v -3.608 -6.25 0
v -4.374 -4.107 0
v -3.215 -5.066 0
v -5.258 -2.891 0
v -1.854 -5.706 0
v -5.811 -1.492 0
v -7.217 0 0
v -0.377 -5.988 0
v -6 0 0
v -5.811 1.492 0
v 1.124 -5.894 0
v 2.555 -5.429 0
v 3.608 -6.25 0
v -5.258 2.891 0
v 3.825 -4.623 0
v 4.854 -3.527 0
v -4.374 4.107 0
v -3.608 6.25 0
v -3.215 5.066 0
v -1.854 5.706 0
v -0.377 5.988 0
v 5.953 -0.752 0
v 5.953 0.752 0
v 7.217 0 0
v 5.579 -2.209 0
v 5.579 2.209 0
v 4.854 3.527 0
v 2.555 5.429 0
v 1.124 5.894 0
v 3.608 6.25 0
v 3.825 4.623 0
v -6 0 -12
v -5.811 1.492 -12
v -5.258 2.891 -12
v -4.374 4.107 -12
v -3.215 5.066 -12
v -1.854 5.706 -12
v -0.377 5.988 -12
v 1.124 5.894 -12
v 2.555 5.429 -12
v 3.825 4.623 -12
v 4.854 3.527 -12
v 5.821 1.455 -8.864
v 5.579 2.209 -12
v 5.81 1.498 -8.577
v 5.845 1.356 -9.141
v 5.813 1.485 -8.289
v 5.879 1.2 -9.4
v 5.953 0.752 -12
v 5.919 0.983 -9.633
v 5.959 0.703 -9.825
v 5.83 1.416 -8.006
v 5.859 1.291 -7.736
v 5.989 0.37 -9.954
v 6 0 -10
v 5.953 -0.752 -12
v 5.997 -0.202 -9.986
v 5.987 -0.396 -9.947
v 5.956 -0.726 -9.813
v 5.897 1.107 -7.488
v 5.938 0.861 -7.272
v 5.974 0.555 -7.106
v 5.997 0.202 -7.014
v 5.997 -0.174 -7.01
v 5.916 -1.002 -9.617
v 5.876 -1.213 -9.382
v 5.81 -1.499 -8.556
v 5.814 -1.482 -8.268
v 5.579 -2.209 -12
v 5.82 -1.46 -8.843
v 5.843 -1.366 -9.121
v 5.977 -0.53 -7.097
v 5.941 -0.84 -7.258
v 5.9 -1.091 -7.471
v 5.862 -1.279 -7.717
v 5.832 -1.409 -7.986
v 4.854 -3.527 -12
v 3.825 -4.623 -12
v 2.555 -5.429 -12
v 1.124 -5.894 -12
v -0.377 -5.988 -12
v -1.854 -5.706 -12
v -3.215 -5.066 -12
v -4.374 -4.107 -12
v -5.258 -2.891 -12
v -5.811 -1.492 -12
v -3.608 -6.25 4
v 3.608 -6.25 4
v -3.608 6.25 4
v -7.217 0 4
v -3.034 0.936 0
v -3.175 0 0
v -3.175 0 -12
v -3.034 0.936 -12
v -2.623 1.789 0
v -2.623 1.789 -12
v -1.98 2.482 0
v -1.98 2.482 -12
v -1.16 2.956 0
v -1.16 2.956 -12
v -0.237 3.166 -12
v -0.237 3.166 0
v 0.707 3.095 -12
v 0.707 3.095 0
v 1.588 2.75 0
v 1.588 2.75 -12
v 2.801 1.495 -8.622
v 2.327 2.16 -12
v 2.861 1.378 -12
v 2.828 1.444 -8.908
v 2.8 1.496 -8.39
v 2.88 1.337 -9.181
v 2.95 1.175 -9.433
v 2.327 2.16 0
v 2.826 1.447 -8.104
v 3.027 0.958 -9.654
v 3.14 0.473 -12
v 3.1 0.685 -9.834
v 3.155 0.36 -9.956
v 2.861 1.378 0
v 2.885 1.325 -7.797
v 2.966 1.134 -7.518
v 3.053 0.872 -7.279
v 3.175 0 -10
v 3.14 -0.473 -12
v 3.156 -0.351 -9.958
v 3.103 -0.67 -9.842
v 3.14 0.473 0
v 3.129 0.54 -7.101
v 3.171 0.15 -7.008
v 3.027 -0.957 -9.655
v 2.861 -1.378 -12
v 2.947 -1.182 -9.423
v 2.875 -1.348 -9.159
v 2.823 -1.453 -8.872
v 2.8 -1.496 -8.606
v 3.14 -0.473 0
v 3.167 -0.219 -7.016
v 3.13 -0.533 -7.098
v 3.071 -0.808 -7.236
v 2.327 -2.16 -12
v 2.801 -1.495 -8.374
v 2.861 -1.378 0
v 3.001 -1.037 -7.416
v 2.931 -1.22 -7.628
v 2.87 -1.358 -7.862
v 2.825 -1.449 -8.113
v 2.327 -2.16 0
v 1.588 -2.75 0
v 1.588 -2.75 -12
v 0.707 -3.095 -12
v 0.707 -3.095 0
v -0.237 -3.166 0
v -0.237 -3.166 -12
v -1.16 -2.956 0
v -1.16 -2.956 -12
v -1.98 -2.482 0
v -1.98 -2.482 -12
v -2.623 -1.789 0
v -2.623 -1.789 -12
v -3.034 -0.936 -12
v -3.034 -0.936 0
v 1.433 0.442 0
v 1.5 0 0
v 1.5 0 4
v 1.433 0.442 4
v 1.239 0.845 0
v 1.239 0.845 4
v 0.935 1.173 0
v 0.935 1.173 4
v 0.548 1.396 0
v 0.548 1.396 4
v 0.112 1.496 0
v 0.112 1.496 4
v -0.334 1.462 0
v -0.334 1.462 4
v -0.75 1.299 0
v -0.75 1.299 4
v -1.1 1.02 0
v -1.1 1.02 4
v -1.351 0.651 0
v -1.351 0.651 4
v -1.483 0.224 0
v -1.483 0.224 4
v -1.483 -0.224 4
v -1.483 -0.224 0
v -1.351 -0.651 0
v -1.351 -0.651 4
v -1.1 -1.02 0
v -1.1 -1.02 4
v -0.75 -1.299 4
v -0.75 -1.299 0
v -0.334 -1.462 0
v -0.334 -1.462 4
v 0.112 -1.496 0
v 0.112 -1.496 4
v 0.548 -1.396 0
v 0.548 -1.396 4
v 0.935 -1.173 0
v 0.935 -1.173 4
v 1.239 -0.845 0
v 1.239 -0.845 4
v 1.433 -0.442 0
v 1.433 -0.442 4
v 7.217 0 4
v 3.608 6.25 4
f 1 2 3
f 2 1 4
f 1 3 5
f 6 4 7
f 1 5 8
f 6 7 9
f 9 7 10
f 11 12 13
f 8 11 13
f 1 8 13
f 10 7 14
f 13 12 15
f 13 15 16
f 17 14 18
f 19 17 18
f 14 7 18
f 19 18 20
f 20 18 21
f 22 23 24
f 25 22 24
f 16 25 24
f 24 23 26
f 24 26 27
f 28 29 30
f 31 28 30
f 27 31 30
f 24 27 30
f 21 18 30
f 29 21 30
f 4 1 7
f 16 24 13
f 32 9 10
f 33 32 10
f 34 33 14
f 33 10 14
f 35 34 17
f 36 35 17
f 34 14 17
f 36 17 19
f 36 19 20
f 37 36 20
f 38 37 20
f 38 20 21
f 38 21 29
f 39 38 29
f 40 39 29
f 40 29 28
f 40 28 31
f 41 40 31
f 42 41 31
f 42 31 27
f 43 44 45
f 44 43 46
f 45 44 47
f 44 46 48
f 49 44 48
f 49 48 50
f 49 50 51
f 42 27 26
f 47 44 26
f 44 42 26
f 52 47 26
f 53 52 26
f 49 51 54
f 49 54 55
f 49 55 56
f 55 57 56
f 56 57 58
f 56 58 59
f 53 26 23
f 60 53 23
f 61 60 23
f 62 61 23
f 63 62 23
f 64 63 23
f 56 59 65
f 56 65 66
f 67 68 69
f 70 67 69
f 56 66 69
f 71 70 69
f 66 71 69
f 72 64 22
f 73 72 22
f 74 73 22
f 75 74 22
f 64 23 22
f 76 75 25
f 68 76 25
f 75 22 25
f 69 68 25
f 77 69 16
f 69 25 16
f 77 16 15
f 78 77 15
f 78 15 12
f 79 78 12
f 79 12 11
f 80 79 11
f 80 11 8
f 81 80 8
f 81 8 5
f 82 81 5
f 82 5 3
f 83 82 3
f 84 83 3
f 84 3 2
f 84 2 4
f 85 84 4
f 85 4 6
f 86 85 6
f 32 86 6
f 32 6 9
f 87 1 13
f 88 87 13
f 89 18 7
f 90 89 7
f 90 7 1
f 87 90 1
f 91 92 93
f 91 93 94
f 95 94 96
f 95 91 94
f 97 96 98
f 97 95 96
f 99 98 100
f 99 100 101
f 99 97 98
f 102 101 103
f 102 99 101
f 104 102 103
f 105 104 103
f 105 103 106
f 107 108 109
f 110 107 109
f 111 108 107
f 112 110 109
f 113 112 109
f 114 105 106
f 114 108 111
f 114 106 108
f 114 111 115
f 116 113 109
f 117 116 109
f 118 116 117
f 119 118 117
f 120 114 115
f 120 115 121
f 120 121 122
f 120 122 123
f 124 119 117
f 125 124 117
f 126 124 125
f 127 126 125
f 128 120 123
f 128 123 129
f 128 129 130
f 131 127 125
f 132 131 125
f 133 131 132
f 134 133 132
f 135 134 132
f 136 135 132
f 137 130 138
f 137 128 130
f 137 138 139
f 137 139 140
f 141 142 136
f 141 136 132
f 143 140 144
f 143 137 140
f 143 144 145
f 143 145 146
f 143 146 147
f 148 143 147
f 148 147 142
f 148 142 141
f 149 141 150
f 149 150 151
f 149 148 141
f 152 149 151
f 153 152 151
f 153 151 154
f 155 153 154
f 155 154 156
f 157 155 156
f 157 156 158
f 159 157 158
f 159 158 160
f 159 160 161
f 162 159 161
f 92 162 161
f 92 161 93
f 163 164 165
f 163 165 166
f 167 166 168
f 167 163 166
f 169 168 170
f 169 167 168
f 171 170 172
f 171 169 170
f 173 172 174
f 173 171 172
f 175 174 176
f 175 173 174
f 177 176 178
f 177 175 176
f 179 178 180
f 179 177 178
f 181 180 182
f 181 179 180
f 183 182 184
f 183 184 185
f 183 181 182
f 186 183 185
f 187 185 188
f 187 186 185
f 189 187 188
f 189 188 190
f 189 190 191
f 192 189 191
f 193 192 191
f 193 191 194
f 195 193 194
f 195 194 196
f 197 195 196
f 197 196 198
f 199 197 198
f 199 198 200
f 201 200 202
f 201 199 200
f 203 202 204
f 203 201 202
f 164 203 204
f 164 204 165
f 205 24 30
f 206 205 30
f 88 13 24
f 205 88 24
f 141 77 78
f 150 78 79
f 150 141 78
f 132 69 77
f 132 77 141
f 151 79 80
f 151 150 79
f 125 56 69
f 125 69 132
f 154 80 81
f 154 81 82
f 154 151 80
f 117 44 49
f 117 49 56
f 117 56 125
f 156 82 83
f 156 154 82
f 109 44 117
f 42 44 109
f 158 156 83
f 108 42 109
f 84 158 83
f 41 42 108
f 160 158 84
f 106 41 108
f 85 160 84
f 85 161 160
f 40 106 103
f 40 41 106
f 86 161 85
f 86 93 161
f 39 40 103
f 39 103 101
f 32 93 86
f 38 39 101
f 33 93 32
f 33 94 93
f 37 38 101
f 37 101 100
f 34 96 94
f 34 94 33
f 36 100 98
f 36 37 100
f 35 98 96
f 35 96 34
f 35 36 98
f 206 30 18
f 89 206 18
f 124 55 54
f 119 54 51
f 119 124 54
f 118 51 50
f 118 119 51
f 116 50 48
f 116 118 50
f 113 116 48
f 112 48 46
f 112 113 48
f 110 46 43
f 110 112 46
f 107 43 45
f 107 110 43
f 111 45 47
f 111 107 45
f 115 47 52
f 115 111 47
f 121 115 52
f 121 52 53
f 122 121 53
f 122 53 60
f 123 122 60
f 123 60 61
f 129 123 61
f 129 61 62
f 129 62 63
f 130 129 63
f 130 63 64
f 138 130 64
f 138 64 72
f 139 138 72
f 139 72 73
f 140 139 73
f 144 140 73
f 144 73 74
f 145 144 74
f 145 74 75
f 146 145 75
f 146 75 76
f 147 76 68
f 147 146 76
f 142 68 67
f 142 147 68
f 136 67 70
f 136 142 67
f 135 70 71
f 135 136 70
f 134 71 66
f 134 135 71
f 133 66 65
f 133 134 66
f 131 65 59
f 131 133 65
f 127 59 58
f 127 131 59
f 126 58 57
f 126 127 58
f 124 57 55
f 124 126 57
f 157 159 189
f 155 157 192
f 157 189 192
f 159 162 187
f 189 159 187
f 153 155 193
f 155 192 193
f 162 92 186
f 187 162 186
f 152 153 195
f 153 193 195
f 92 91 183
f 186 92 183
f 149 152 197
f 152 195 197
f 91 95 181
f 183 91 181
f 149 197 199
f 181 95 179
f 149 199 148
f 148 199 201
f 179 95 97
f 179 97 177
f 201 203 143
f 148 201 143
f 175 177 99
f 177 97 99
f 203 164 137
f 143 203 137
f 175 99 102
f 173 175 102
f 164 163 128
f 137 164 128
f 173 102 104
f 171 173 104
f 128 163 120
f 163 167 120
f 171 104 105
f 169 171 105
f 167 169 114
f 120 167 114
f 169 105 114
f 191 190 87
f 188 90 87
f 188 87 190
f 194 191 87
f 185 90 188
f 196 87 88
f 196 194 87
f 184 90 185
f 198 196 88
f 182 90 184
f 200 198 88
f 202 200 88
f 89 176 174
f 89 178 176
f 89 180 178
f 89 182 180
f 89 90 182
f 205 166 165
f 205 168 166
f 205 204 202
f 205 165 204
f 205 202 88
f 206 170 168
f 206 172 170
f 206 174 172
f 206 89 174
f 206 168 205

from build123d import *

# Parameters (mm, degrees)
CROQUIS2_R              = 1.5
SALIENTE_EXTRUIR1_DEPTH = 4
CROQUIS3_R              = 6
CROQUIS3_R_2            = 3.175
SALIENTE_EXTRUIR2_DEPTH = 12
CROQUIS4_R              = 1.5
CORTAR_EXTRUIR1_DEPTH   = 10


with BuildPart() as part:
    # Croquis2 → Saliente-Extruir1 (new body)
    with BuildSketch(Plane.XY):
        Polygon((3.608439182, 6.25), (-3.608439182, 6.25), (-7.216878365, 0), (-3.608439182, -6.25), (3.608439182, -6.25), (7.216878365, 0), align=None)
        Circle(CROQUIS2_R, mode=Mode.SUBTRACT)
    extrude(amount=SALIENTE_EXTRUIR1_DEPTH)

    # Croquis3 → Saliente-Extruir2 (add)
    with BuildSketch(Plane(origin=(0, 0, 0), x_dir=(-1, 0, 0), z_dir=(0, 0, -1))):
        Circle(CROQUIS3_R)
        Circle(CROQUIS3_R_2, mode=Mode.SUBTRACT)
    extrude(amount=SALIENTE_EXTRUIR2_DEPTH)

    # Croquis4 → Cortar-Extruir1 (cut)
    with BuildSketch(Plane(origin=(0, 0, 0), x_dir=(0, 0, -1), z_dir=(1, 0, 0))):
        with Locations((8.5, 0)):
            Circle(CROQUIS4_R)
    extrude(amount=CORTAR_EXTRUIR1_DEPTH, mode=Mode.SUBTRACT)


solid = part.part
